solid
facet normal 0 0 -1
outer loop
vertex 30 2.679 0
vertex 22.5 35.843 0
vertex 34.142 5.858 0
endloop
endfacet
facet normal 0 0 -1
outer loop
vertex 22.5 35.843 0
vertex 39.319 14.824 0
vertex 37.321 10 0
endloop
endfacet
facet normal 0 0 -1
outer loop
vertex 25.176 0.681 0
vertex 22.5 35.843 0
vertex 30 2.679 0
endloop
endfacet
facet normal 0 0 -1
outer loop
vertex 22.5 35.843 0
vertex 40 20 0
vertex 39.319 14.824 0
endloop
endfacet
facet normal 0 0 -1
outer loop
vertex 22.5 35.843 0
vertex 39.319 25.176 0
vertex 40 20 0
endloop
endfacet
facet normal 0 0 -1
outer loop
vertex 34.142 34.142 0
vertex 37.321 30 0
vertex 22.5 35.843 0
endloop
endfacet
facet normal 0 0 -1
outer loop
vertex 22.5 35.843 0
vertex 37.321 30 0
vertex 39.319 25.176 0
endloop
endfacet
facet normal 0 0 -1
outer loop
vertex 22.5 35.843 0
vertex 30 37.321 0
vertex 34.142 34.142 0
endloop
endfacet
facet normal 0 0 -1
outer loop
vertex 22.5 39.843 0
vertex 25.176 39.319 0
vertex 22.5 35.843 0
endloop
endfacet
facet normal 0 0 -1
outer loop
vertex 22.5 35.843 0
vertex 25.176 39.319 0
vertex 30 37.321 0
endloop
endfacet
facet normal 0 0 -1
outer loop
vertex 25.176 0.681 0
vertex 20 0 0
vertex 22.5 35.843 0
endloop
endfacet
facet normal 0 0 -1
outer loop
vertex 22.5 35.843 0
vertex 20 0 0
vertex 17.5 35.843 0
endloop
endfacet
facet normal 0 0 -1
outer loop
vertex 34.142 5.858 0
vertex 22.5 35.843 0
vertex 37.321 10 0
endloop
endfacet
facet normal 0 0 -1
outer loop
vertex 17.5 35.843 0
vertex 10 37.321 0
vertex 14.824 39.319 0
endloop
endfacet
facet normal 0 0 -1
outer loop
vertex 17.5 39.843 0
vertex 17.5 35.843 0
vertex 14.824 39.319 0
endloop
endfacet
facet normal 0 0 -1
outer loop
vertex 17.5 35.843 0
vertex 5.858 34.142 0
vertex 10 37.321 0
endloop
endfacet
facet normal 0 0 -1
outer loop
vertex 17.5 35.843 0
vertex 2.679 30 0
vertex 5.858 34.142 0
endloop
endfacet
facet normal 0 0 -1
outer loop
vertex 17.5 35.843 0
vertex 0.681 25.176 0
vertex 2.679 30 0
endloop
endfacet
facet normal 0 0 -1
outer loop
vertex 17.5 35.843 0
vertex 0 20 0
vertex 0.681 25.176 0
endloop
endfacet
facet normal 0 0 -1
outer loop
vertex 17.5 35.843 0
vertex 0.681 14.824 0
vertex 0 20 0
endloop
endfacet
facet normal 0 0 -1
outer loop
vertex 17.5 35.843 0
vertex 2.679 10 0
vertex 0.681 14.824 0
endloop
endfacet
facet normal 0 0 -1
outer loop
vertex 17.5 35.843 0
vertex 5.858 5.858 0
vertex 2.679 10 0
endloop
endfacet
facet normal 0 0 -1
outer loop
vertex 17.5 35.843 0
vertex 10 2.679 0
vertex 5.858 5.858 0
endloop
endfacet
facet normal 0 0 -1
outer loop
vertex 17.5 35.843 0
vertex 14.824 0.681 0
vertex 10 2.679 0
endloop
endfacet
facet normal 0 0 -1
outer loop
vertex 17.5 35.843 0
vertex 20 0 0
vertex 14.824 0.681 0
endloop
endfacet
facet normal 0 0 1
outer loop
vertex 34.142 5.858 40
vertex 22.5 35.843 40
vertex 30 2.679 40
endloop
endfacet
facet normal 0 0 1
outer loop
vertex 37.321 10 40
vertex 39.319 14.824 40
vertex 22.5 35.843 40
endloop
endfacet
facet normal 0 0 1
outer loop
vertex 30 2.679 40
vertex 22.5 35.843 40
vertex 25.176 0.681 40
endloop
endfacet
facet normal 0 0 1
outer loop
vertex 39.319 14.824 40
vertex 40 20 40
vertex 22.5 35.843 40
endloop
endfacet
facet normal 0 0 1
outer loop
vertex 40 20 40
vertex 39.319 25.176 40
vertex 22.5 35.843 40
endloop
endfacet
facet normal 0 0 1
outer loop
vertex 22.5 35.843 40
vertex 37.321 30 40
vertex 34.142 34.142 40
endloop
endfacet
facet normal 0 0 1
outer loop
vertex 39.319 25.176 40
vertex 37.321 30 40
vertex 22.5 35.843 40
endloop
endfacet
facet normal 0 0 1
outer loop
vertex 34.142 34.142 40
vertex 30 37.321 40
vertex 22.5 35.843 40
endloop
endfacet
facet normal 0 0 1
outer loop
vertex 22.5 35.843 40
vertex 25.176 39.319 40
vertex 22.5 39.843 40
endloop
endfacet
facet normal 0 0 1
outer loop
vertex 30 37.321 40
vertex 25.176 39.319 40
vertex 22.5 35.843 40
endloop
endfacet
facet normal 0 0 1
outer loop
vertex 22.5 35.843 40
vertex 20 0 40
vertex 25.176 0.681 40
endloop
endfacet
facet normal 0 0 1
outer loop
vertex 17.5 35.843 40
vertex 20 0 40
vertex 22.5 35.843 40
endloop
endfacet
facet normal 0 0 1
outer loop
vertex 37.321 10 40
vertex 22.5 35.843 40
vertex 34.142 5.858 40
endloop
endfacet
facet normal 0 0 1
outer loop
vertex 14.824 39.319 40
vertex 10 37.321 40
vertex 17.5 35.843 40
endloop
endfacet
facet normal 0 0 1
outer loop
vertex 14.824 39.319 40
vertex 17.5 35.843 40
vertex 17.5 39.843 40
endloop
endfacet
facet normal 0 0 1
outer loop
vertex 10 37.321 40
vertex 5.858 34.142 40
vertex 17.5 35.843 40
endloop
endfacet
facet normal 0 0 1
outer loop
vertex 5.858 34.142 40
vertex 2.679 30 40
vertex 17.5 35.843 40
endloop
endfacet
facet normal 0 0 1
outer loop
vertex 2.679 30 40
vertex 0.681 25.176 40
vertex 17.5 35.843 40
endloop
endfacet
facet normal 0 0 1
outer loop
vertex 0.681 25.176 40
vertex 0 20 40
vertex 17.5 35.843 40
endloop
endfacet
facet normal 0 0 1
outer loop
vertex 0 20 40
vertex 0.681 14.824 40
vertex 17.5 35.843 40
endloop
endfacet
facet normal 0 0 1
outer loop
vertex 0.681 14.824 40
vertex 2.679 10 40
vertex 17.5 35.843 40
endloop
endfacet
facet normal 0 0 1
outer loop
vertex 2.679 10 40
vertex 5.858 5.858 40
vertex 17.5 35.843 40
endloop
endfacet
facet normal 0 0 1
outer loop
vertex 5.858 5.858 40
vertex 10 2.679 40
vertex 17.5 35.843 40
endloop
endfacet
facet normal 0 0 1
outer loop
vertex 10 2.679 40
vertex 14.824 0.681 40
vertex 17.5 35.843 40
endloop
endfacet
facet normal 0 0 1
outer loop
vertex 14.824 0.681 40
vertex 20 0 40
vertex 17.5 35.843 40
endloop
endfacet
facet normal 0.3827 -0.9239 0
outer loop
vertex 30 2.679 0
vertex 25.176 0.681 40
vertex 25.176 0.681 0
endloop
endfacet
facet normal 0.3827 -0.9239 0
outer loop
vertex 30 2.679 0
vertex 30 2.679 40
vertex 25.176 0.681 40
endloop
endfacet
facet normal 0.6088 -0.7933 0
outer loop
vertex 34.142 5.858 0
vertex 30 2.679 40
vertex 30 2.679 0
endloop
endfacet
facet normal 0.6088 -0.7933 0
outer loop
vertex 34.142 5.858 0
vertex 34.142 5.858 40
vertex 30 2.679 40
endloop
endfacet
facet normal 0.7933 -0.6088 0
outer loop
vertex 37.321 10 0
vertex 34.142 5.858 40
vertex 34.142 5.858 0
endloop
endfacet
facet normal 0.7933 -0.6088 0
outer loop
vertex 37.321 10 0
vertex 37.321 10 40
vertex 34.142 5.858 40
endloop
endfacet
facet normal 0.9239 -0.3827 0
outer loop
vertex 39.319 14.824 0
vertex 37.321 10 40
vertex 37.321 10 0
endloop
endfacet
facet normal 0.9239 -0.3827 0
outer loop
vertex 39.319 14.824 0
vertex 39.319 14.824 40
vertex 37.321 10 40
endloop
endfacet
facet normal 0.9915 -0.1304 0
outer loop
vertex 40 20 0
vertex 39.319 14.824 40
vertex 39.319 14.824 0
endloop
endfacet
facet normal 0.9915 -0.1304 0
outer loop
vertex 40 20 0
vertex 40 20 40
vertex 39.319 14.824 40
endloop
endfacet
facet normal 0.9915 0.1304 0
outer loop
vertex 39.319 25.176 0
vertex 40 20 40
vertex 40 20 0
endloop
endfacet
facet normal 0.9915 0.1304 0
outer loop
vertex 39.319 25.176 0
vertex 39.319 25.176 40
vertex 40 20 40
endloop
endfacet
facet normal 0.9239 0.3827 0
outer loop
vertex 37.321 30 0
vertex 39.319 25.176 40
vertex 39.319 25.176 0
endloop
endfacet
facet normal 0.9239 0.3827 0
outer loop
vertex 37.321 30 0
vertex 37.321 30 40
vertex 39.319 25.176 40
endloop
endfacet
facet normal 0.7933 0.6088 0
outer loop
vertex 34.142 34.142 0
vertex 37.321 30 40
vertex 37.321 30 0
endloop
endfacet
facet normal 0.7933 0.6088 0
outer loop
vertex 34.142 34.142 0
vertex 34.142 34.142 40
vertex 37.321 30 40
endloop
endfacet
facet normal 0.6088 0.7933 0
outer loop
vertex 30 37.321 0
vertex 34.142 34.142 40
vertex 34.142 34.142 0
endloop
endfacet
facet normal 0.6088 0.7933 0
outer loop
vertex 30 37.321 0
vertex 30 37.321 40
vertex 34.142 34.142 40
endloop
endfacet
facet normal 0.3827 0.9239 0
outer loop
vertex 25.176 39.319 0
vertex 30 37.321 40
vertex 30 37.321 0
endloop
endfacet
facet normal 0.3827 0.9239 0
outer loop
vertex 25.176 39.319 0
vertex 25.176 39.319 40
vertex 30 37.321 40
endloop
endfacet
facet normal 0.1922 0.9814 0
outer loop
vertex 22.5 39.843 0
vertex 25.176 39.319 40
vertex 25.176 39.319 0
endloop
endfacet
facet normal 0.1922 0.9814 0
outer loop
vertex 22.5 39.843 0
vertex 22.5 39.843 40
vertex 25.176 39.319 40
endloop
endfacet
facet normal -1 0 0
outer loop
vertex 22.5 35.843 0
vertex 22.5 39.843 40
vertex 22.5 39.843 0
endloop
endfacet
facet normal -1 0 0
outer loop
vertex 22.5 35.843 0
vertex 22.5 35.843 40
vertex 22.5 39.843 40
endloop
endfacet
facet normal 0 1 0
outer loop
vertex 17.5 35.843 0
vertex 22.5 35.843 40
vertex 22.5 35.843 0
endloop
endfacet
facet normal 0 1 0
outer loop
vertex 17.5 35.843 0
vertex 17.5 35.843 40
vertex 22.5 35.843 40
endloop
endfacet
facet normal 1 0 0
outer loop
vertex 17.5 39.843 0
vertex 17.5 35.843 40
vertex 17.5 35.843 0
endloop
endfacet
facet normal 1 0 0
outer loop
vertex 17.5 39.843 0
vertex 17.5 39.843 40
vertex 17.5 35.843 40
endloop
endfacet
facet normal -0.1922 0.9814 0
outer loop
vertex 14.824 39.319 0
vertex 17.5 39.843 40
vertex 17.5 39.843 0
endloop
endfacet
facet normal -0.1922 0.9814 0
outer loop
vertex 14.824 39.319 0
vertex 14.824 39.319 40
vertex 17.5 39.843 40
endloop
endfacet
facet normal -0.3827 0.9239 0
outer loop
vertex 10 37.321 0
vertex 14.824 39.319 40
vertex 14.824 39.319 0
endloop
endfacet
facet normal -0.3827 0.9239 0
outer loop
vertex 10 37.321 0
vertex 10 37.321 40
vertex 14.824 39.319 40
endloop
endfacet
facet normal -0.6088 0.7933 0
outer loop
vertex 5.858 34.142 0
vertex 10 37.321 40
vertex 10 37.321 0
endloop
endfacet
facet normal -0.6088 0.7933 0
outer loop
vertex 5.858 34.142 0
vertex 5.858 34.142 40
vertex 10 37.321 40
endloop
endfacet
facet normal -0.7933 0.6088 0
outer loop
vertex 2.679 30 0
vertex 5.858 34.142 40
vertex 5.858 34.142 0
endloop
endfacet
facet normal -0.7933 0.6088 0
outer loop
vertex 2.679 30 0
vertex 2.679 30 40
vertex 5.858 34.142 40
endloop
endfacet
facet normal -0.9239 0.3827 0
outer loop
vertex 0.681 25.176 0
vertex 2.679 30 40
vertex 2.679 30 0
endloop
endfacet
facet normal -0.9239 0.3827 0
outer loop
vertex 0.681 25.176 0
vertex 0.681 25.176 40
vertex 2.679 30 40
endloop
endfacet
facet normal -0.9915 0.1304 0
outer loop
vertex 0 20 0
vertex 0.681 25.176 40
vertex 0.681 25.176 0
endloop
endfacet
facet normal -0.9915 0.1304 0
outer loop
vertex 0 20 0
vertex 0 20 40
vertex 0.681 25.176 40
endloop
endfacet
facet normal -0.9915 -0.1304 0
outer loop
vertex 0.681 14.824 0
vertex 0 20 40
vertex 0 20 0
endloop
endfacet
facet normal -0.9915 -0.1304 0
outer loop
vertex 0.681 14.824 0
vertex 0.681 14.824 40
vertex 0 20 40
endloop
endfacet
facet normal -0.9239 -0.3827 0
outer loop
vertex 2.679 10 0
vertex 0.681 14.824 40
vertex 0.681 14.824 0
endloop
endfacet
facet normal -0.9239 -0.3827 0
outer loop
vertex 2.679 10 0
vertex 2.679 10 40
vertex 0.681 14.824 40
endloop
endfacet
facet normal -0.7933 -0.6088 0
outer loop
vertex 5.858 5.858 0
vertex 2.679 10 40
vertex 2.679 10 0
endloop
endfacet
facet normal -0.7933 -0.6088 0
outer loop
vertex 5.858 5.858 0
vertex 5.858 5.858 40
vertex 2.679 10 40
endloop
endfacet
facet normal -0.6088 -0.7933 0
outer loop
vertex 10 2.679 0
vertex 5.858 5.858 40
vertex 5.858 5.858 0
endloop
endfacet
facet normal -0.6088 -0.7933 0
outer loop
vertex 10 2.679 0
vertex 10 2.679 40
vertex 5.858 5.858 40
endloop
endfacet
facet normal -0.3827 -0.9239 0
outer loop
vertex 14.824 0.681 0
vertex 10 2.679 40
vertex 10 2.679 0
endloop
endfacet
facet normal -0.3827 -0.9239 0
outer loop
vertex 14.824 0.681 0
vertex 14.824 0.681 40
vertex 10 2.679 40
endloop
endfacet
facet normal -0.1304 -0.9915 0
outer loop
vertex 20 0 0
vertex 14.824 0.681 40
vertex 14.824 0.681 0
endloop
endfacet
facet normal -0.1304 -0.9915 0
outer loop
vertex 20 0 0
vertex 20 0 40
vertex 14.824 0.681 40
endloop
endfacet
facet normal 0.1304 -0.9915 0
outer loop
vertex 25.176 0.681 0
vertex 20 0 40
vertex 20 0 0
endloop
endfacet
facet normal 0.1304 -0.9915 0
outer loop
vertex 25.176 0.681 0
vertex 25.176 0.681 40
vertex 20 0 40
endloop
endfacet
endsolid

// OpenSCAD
$fn = 32;

// ----------------------------------------------------------------------
// Keyway shaft: d40 shaft, key 5 x 4 mm
// ----------------------------------------------------------------------

// --- parameters (mm) ---
shaft_r = 20;             // shaft radius
key_w = 5;                // keyway width
key_d = 4;                // keyway depth below the surface line
plate_t = 40;             // shaft length, Z (extrusion height)
fit_tol = 0.02;           // declared fit tolerance (prompt contract)
free_tol = 0.2;           // declared free tolerance (prompt contract)

shaft_d = 2 * shaft_r;  // shaft diameter
circle_step = 15;  // polygon sampling step, degrees

profile = [[14.824, 39.319], [10, 37.321], [5.858, 34.142], [2.679, 30], [0.681, 25.176], [0, 20], [0.681, 14.824], [2.679, 10], [5.858, 5.858], [10, 2.679], [14.824, 0.681], [20, 0], [25.176, 0.681], [30, 2.679], [34.142, 5.858], [37.321, 10], [39.319, 14.824], [40, 20], [39.319, 25.176], [37.321, 30], [34.142, 34.142], [30, 37.321], [25.176, 39.319], [22.5, 39.843], [22.5, 35.843], [17.5, 35.843], [17.5, 39.843]];  // primary outline, 27 points, counter clockwise

// --- the one profile operation ---
linear_extrude(height = plate_t) polygon(points = profile);
